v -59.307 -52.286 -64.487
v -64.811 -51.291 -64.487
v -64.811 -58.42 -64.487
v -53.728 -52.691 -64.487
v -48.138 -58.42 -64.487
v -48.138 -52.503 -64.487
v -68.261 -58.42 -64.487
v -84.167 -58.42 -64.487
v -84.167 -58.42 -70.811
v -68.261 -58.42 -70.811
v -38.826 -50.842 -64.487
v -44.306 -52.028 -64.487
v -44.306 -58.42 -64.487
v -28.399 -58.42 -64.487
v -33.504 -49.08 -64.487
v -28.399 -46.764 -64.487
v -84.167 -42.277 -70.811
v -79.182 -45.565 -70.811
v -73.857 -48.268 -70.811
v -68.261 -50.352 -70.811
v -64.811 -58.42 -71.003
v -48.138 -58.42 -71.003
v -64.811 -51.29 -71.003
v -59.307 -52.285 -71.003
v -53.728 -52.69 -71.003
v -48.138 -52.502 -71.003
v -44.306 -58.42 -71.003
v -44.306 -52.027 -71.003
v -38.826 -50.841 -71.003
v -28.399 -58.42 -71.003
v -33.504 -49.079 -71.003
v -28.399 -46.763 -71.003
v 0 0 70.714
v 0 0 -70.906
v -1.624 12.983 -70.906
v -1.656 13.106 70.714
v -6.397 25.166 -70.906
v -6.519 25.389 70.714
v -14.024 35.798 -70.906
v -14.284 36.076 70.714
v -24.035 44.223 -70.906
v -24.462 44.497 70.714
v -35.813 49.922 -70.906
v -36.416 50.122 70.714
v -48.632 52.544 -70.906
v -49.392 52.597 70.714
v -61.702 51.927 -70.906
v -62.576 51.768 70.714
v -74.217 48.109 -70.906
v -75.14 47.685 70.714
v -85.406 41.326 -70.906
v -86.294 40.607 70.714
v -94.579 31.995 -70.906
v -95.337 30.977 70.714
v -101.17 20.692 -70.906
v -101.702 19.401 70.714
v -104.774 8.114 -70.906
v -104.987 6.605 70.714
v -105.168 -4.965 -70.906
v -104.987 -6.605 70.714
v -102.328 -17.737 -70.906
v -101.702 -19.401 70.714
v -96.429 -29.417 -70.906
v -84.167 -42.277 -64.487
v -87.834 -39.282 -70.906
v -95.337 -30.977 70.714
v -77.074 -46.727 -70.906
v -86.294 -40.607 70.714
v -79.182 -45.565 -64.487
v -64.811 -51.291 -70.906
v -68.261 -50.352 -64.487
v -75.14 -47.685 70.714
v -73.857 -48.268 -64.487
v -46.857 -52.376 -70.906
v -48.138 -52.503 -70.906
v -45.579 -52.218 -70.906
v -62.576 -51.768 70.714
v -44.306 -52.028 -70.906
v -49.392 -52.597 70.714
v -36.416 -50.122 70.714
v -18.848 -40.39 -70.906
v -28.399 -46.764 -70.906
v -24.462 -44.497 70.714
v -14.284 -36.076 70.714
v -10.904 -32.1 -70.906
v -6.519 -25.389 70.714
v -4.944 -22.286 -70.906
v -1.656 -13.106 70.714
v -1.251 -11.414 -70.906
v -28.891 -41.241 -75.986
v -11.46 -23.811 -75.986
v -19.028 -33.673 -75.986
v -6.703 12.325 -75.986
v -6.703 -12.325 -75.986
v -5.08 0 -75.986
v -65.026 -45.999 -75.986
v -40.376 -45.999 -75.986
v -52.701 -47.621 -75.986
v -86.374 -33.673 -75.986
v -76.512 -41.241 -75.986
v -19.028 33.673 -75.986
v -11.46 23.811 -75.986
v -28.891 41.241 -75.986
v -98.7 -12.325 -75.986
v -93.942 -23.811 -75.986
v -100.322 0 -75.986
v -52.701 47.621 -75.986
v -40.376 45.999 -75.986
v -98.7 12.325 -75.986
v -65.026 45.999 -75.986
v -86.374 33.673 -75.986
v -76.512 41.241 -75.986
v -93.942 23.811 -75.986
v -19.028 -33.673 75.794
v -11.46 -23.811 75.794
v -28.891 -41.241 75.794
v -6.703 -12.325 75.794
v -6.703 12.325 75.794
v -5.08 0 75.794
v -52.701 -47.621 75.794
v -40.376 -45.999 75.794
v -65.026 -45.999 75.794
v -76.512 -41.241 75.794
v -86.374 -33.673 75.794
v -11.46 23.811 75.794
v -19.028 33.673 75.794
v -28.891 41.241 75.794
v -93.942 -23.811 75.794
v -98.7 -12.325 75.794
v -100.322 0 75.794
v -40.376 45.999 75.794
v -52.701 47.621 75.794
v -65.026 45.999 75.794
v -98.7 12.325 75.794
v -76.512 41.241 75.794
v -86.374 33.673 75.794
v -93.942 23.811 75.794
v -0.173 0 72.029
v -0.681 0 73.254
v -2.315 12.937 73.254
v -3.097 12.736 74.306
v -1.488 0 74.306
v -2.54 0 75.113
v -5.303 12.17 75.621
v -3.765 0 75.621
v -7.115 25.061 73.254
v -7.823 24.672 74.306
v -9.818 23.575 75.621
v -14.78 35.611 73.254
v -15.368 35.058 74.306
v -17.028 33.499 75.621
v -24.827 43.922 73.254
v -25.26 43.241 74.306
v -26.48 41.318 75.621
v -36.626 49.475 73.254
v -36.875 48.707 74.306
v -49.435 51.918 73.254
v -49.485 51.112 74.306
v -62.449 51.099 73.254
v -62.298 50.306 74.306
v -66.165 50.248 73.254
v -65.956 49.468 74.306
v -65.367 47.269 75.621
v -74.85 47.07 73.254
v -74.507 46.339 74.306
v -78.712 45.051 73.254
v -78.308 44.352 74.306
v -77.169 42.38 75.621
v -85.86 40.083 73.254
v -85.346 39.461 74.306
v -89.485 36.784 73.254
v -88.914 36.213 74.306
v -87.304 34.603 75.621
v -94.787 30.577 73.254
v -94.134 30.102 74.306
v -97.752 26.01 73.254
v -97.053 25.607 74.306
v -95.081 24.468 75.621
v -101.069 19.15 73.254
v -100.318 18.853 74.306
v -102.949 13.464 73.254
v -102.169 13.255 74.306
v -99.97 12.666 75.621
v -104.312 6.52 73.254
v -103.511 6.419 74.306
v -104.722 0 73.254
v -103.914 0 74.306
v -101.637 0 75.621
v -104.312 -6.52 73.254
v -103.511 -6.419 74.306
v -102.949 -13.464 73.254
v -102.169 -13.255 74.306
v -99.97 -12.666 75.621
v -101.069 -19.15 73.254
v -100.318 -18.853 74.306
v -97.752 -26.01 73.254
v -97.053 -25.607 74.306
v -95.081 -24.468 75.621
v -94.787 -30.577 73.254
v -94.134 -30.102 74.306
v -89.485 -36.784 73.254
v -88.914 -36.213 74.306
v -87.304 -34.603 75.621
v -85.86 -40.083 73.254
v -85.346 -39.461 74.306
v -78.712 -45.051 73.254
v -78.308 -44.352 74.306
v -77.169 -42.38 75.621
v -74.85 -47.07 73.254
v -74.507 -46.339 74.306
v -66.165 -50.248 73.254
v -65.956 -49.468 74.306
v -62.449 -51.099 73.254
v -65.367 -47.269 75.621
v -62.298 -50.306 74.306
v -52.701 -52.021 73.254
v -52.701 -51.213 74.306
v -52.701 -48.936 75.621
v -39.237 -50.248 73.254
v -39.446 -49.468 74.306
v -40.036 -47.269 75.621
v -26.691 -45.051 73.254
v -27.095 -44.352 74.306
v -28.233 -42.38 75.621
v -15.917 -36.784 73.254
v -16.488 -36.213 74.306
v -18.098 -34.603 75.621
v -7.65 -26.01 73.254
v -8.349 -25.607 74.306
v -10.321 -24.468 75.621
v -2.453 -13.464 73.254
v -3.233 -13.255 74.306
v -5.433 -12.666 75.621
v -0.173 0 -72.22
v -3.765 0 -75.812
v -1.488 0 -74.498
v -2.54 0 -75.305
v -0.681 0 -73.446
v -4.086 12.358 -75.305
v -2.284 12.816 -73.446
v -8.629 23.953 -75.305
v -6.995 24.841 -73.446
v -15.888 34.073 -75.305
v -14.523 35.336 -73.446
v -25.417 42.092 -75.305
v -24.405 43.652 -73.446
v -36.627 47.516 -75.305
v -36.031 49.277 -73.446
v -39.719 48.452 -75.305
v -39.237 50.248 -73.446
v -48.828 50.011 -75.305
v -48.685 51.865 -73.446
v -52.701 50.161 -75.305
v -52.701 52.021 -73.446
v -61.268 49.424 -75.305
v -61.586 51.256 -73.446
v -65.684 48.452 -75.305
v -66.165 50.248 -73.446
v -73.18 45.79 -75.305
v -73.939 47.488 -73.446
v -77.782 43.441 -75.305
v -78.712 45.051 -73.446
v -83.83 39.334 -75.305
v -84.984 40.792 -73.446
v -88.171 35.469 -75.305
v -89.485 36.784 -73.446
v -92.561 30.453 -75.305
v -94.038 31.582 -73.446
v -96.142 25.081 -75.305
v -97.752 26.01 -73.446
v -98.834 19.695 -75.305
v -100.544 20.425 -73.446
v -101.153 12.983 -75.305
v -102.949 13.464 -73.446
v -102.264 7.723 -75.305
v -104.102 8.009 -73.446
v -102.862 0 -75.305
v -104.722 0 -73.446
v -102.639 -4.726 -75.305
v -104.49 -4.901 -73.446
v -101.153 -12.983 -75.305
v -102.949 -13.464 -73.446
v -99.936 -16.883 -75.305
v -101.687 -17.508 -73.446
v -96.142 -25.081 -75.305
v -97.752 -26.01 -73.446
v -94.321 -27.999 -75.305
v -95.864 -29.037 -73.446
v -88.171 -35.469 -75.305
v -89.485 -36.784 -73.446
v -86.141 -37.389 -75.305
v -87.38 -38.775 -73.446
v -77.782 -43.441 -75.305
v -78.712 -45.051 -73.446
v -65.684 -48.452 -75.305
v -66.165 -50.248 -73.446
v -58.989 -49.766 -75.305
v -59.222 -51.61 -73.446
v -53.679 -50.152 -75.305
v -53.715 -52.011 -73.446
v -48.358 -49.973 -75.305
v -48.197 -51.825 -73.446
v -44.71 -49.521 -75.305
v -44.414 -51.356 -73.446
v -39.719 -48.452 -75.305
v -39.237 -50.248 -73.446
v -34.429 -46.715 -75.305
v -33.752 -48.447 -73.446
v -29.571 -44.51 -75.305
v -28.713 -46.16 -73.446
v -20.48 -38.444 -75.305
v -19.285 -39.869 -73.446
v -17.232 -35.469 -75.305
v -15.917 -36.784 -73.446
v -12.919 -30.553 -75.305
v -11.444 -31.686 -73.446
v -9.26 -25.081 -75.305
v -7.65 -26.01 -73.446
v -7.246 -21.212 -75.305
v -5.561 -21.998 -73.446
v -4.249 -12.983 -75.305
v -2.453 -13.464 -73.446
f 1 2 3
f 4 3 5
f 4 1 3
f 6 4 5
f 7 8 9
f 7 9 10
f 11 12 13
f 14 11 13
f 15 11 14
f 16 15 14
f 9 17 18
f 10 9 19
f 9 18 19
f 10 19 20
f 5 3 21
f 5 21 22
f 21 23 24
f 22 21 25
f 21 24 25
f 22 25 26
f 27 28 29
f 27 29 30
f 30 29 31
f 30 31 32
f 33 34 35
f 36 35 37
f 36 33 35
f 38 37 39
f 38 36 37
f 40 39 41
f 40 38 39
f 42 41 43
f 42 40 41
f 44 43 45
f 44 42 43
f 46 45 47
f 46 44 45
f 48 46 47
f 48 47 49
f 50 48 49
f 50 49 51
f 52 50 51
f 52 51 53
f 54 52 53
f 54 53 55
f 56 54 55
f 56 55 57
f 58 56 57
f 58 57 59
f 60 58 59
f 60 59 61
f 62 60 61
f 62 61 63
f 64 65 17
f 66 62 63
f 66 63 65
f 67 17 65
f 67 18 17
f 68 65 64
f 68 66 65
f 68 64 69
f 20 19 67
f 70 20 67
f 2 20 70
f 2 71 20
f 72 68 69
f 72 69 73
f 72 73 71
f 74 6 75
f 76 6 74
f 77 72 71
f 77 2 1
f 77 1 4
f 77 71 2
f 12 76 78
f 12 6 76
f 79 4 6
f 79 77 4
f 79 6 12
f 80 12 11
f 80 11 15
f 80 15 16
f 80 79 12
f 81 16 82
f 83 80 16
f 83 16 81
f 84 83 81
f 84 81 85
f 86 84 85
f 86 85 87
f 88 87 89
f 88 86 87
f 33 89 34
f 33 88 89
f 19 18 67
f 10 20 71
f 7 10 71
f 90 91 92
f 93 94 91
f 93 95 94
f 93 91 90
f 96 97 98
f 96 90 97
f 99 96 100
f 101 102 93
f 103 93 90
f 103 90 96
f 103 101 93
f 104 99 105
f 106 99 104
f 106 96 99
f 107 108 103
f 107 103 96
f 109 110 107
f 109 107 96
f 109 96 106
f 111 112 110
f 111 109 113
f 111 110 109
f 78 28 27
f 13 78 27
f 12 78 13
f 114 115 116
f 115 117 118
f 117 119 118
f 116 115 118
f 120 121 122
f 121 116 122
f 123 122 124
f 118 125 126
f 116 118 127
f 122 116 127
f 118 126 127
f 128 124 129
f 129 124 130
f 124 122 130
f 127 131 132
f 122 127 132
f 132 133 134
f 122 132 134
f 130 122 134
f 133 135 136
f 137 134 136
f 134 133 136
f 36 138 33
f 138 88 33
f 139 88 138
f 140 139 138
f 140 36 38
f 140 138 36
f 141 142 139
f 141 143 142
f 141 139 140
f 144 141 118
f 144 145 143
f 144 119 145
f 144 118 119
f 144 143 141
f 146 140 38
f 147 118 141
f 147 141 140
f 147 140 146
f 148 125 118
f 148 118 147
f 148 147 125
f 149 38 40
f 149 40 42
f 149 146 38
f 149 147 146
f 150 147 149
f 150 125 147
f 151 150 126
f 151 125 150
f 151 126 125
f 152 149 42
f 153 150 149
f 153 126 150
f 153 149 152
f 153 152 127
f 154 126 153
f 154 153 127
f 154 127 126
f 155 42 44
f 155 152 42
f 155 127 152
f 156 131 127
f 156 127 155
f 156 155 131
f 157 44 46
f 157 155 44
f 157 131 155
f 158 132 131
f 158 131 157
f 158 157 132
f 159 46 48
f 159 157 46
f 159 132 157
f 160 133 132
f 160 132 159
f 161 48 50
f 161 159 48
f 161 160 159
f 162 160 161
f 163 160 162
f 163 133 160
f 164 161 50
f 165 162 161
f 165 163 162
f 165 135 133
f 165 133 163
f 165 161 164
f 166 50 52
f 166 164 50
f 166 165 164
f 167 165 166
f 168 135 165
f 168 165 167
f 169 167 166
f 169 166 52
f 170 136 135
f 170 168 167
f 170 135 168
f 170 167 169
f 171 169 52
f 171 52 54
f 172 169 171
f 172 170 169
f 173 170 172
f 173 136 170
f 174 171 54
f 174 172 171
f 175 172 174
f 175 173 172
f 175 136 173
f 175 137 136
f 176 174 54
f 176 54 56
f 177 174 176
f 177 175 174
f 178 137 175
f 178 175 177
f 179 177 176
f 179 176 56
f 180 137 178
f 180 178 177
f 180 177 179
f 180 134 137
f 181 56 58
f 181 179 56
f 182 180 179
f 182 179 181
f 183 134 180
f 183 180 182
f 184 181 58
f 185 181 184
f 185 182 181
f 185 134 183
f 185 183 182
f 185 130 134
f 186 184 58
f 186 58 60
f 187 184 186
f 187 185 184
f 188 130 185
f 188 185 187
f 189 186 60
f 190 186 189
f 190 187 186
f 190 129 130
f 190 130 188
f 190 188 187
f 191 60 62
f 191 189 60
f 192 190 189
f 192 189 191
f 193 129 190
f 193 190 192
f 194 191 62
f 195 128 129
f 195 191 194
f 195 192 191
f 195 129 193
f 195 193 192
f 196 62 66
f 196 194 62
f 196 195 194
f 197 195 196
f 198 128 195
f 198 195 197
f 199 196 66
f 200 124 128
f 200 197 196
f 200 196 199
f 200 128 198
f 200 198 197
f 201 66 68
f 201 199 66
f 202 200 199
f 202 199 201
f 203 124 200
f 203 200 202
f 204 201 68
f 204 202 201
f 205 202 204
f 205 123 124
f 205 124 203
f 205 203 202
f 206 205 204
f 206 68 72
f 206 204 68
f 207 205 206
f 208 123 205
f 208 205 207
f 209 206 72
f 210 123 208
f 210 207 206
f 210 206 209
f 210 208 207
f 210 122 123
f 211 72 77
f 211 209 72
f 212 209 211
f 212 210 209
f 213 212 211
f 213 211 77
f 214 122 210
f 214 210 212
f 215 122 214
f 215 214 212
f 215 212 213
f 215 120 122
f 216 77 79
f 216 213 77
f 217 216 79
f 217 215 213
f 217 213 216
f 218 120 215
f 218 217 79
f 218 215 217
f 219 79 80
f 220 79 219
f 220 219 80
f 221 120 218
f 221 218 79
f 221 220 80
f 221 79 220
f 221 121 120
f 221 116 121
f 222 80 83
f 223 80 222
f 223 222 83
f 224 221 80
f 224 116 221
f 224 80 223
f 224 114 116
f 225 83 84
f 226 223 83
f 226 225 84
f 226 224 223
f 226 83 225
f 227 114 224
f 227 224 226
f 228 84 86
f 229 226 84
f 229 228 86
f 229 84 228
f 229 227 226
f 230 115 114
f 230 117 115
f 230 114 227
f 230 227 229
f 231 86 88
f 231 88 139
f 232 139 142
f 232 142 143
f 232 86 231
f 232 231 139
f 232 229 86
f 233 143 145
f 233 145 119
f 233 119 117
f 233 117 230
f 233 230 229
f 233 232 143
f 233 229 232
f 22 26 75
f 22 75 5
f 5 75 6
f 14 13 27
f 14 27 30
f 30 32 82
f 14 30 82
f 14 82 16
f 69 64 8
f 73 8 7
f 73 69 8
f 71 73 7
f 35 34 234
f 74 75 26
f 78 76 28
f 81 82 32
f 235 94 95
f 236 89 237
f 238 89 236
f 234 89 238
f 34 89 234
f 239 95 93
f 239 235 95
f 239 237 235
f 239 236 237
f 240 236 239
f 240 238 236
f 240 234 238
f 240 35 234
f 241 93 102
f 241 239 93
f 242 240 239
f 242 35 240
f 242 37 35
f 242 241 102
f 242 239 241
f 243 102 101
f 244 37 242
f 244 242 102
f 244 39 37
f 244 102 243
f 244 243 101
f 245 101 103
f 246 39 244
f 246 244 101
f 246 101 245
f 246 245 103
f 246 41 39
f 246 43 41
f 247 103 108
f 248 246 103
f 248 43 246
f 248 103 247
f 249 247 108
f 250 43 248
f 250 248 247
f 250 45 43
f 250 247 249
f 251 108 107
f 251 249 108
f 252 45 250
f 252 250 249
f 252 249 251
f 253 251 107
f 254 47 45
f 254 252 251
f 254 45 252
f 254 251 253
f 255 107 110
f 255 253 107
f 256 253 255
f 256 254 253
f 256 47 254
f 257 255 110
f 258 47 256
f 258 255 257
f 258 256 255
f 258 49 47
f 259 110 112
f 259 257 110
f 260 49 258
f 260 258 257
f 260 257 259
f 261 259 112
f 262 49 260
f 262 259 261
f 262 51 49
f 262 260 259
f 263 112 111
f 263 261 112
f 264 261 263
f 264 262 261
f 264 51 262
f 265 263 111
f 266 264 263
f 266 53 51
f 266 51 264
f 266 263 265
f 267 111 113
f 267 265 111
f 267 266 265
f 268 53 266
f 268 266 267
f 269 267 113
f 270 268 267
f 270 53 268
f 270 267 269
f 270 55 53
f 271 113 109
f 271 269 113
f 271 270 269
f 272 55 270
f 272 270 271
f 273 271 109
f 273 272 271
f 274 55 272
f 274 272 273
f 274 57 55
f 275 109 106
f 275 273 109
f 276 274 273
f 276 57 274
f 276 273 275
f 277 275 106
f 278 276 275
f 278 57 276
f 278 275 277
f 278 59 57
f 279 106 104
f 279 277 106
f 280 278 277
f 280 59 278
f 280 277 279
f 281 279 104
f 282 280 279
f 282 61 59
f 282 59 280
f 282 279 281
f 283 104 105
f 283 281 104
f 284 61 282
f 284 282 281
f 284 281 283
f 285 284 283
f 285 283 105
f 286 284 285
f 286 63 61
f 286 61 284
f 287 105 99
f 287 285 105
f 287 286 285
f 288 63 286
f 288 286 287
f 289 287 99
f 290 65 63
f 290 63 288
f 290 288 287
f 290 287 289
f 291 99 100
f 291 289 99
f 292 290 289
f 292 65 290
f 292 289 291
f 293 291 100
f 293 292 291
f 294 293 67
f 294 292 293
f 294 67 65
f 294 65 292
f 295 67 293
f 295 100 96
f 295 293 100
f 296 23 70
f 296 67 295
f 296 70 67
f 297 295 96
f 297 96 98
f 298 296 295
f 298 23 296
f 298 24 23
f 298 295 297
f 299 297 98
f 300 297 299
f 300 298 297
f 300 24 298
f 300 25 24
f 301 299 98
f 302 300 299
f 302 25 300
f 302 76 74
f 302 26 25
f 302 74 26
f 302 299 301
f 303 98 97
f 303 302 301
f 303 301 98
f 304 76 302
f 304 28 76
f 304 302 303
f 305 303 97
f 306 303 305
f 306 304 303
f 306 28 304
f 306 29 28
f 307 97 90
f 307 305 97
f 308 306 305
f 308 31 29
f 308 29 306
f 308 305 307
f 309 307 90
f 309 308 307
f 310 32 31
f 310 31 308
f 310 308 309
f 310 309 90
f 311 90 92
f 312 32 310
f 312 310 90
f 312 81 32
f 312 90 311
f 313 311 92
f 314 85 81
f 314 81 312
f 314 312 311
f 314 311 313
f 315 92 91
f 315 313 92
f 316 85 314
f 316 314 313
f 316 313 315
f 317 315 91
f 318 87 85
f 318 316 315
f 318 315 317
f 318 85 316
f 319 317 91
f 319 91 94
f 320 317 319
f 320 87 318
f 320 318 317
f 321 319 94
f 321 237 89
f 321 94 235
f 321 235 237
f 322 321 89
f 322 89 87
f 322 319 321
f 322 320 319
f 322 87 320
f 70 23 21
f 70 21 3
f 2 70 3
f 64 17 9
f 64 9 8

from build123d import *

# Parameters (mm, degrees)
F0_W     = 52.7011975646
F0_H     = 151.7794504762
F2_R     = 5.08
F3_W     = 15.9061774611
F3_H     = 6.3241422176
F3_W_2   = 16.6727416217
F3_H_2   = 6.5157860518
F3_W_3   = 15.9061811864
F4_DEPTH = 58.42


with BuildPart() as f1:
    # F0 (on Front) → F1 (revolve)
    with BuildSketch(Plane.XZ):
        with Locations((-26.3505987823, -0.0958181918)):
            Rectangle(F0_W, F0_H)
    revolve(axis=Axis((-52.7011975646, 0, -0.0958181918), (0, 0, 1)))

    # F2
    f2_edges = [f1.edges().sort_by_distance(p)[0] for p in [
        (-105.402395, 0, 75.793907),
        (-105.402395, 0, -75.985543),
    ]]
    fillet(f2_edges, radius=F2_R)

    # F3 (on Front) → F4 (join)
    with BuildSketch(Plane.XZ):
        with Locations((-76.2136913836, -67.6491707563)):
            Rectangle(F3_W, F3_H)
        with Locations((-56.4746949822, -67.7449926734)):
            Rectangle(F3_W_2, F3_H_2)
        with Locations((-36.3524202257, -67.7449926734)):
            Rectangle(F3_W_3, F3_H_2)
    extrude(amount=F4_DEPTH)


solid = f1.part
